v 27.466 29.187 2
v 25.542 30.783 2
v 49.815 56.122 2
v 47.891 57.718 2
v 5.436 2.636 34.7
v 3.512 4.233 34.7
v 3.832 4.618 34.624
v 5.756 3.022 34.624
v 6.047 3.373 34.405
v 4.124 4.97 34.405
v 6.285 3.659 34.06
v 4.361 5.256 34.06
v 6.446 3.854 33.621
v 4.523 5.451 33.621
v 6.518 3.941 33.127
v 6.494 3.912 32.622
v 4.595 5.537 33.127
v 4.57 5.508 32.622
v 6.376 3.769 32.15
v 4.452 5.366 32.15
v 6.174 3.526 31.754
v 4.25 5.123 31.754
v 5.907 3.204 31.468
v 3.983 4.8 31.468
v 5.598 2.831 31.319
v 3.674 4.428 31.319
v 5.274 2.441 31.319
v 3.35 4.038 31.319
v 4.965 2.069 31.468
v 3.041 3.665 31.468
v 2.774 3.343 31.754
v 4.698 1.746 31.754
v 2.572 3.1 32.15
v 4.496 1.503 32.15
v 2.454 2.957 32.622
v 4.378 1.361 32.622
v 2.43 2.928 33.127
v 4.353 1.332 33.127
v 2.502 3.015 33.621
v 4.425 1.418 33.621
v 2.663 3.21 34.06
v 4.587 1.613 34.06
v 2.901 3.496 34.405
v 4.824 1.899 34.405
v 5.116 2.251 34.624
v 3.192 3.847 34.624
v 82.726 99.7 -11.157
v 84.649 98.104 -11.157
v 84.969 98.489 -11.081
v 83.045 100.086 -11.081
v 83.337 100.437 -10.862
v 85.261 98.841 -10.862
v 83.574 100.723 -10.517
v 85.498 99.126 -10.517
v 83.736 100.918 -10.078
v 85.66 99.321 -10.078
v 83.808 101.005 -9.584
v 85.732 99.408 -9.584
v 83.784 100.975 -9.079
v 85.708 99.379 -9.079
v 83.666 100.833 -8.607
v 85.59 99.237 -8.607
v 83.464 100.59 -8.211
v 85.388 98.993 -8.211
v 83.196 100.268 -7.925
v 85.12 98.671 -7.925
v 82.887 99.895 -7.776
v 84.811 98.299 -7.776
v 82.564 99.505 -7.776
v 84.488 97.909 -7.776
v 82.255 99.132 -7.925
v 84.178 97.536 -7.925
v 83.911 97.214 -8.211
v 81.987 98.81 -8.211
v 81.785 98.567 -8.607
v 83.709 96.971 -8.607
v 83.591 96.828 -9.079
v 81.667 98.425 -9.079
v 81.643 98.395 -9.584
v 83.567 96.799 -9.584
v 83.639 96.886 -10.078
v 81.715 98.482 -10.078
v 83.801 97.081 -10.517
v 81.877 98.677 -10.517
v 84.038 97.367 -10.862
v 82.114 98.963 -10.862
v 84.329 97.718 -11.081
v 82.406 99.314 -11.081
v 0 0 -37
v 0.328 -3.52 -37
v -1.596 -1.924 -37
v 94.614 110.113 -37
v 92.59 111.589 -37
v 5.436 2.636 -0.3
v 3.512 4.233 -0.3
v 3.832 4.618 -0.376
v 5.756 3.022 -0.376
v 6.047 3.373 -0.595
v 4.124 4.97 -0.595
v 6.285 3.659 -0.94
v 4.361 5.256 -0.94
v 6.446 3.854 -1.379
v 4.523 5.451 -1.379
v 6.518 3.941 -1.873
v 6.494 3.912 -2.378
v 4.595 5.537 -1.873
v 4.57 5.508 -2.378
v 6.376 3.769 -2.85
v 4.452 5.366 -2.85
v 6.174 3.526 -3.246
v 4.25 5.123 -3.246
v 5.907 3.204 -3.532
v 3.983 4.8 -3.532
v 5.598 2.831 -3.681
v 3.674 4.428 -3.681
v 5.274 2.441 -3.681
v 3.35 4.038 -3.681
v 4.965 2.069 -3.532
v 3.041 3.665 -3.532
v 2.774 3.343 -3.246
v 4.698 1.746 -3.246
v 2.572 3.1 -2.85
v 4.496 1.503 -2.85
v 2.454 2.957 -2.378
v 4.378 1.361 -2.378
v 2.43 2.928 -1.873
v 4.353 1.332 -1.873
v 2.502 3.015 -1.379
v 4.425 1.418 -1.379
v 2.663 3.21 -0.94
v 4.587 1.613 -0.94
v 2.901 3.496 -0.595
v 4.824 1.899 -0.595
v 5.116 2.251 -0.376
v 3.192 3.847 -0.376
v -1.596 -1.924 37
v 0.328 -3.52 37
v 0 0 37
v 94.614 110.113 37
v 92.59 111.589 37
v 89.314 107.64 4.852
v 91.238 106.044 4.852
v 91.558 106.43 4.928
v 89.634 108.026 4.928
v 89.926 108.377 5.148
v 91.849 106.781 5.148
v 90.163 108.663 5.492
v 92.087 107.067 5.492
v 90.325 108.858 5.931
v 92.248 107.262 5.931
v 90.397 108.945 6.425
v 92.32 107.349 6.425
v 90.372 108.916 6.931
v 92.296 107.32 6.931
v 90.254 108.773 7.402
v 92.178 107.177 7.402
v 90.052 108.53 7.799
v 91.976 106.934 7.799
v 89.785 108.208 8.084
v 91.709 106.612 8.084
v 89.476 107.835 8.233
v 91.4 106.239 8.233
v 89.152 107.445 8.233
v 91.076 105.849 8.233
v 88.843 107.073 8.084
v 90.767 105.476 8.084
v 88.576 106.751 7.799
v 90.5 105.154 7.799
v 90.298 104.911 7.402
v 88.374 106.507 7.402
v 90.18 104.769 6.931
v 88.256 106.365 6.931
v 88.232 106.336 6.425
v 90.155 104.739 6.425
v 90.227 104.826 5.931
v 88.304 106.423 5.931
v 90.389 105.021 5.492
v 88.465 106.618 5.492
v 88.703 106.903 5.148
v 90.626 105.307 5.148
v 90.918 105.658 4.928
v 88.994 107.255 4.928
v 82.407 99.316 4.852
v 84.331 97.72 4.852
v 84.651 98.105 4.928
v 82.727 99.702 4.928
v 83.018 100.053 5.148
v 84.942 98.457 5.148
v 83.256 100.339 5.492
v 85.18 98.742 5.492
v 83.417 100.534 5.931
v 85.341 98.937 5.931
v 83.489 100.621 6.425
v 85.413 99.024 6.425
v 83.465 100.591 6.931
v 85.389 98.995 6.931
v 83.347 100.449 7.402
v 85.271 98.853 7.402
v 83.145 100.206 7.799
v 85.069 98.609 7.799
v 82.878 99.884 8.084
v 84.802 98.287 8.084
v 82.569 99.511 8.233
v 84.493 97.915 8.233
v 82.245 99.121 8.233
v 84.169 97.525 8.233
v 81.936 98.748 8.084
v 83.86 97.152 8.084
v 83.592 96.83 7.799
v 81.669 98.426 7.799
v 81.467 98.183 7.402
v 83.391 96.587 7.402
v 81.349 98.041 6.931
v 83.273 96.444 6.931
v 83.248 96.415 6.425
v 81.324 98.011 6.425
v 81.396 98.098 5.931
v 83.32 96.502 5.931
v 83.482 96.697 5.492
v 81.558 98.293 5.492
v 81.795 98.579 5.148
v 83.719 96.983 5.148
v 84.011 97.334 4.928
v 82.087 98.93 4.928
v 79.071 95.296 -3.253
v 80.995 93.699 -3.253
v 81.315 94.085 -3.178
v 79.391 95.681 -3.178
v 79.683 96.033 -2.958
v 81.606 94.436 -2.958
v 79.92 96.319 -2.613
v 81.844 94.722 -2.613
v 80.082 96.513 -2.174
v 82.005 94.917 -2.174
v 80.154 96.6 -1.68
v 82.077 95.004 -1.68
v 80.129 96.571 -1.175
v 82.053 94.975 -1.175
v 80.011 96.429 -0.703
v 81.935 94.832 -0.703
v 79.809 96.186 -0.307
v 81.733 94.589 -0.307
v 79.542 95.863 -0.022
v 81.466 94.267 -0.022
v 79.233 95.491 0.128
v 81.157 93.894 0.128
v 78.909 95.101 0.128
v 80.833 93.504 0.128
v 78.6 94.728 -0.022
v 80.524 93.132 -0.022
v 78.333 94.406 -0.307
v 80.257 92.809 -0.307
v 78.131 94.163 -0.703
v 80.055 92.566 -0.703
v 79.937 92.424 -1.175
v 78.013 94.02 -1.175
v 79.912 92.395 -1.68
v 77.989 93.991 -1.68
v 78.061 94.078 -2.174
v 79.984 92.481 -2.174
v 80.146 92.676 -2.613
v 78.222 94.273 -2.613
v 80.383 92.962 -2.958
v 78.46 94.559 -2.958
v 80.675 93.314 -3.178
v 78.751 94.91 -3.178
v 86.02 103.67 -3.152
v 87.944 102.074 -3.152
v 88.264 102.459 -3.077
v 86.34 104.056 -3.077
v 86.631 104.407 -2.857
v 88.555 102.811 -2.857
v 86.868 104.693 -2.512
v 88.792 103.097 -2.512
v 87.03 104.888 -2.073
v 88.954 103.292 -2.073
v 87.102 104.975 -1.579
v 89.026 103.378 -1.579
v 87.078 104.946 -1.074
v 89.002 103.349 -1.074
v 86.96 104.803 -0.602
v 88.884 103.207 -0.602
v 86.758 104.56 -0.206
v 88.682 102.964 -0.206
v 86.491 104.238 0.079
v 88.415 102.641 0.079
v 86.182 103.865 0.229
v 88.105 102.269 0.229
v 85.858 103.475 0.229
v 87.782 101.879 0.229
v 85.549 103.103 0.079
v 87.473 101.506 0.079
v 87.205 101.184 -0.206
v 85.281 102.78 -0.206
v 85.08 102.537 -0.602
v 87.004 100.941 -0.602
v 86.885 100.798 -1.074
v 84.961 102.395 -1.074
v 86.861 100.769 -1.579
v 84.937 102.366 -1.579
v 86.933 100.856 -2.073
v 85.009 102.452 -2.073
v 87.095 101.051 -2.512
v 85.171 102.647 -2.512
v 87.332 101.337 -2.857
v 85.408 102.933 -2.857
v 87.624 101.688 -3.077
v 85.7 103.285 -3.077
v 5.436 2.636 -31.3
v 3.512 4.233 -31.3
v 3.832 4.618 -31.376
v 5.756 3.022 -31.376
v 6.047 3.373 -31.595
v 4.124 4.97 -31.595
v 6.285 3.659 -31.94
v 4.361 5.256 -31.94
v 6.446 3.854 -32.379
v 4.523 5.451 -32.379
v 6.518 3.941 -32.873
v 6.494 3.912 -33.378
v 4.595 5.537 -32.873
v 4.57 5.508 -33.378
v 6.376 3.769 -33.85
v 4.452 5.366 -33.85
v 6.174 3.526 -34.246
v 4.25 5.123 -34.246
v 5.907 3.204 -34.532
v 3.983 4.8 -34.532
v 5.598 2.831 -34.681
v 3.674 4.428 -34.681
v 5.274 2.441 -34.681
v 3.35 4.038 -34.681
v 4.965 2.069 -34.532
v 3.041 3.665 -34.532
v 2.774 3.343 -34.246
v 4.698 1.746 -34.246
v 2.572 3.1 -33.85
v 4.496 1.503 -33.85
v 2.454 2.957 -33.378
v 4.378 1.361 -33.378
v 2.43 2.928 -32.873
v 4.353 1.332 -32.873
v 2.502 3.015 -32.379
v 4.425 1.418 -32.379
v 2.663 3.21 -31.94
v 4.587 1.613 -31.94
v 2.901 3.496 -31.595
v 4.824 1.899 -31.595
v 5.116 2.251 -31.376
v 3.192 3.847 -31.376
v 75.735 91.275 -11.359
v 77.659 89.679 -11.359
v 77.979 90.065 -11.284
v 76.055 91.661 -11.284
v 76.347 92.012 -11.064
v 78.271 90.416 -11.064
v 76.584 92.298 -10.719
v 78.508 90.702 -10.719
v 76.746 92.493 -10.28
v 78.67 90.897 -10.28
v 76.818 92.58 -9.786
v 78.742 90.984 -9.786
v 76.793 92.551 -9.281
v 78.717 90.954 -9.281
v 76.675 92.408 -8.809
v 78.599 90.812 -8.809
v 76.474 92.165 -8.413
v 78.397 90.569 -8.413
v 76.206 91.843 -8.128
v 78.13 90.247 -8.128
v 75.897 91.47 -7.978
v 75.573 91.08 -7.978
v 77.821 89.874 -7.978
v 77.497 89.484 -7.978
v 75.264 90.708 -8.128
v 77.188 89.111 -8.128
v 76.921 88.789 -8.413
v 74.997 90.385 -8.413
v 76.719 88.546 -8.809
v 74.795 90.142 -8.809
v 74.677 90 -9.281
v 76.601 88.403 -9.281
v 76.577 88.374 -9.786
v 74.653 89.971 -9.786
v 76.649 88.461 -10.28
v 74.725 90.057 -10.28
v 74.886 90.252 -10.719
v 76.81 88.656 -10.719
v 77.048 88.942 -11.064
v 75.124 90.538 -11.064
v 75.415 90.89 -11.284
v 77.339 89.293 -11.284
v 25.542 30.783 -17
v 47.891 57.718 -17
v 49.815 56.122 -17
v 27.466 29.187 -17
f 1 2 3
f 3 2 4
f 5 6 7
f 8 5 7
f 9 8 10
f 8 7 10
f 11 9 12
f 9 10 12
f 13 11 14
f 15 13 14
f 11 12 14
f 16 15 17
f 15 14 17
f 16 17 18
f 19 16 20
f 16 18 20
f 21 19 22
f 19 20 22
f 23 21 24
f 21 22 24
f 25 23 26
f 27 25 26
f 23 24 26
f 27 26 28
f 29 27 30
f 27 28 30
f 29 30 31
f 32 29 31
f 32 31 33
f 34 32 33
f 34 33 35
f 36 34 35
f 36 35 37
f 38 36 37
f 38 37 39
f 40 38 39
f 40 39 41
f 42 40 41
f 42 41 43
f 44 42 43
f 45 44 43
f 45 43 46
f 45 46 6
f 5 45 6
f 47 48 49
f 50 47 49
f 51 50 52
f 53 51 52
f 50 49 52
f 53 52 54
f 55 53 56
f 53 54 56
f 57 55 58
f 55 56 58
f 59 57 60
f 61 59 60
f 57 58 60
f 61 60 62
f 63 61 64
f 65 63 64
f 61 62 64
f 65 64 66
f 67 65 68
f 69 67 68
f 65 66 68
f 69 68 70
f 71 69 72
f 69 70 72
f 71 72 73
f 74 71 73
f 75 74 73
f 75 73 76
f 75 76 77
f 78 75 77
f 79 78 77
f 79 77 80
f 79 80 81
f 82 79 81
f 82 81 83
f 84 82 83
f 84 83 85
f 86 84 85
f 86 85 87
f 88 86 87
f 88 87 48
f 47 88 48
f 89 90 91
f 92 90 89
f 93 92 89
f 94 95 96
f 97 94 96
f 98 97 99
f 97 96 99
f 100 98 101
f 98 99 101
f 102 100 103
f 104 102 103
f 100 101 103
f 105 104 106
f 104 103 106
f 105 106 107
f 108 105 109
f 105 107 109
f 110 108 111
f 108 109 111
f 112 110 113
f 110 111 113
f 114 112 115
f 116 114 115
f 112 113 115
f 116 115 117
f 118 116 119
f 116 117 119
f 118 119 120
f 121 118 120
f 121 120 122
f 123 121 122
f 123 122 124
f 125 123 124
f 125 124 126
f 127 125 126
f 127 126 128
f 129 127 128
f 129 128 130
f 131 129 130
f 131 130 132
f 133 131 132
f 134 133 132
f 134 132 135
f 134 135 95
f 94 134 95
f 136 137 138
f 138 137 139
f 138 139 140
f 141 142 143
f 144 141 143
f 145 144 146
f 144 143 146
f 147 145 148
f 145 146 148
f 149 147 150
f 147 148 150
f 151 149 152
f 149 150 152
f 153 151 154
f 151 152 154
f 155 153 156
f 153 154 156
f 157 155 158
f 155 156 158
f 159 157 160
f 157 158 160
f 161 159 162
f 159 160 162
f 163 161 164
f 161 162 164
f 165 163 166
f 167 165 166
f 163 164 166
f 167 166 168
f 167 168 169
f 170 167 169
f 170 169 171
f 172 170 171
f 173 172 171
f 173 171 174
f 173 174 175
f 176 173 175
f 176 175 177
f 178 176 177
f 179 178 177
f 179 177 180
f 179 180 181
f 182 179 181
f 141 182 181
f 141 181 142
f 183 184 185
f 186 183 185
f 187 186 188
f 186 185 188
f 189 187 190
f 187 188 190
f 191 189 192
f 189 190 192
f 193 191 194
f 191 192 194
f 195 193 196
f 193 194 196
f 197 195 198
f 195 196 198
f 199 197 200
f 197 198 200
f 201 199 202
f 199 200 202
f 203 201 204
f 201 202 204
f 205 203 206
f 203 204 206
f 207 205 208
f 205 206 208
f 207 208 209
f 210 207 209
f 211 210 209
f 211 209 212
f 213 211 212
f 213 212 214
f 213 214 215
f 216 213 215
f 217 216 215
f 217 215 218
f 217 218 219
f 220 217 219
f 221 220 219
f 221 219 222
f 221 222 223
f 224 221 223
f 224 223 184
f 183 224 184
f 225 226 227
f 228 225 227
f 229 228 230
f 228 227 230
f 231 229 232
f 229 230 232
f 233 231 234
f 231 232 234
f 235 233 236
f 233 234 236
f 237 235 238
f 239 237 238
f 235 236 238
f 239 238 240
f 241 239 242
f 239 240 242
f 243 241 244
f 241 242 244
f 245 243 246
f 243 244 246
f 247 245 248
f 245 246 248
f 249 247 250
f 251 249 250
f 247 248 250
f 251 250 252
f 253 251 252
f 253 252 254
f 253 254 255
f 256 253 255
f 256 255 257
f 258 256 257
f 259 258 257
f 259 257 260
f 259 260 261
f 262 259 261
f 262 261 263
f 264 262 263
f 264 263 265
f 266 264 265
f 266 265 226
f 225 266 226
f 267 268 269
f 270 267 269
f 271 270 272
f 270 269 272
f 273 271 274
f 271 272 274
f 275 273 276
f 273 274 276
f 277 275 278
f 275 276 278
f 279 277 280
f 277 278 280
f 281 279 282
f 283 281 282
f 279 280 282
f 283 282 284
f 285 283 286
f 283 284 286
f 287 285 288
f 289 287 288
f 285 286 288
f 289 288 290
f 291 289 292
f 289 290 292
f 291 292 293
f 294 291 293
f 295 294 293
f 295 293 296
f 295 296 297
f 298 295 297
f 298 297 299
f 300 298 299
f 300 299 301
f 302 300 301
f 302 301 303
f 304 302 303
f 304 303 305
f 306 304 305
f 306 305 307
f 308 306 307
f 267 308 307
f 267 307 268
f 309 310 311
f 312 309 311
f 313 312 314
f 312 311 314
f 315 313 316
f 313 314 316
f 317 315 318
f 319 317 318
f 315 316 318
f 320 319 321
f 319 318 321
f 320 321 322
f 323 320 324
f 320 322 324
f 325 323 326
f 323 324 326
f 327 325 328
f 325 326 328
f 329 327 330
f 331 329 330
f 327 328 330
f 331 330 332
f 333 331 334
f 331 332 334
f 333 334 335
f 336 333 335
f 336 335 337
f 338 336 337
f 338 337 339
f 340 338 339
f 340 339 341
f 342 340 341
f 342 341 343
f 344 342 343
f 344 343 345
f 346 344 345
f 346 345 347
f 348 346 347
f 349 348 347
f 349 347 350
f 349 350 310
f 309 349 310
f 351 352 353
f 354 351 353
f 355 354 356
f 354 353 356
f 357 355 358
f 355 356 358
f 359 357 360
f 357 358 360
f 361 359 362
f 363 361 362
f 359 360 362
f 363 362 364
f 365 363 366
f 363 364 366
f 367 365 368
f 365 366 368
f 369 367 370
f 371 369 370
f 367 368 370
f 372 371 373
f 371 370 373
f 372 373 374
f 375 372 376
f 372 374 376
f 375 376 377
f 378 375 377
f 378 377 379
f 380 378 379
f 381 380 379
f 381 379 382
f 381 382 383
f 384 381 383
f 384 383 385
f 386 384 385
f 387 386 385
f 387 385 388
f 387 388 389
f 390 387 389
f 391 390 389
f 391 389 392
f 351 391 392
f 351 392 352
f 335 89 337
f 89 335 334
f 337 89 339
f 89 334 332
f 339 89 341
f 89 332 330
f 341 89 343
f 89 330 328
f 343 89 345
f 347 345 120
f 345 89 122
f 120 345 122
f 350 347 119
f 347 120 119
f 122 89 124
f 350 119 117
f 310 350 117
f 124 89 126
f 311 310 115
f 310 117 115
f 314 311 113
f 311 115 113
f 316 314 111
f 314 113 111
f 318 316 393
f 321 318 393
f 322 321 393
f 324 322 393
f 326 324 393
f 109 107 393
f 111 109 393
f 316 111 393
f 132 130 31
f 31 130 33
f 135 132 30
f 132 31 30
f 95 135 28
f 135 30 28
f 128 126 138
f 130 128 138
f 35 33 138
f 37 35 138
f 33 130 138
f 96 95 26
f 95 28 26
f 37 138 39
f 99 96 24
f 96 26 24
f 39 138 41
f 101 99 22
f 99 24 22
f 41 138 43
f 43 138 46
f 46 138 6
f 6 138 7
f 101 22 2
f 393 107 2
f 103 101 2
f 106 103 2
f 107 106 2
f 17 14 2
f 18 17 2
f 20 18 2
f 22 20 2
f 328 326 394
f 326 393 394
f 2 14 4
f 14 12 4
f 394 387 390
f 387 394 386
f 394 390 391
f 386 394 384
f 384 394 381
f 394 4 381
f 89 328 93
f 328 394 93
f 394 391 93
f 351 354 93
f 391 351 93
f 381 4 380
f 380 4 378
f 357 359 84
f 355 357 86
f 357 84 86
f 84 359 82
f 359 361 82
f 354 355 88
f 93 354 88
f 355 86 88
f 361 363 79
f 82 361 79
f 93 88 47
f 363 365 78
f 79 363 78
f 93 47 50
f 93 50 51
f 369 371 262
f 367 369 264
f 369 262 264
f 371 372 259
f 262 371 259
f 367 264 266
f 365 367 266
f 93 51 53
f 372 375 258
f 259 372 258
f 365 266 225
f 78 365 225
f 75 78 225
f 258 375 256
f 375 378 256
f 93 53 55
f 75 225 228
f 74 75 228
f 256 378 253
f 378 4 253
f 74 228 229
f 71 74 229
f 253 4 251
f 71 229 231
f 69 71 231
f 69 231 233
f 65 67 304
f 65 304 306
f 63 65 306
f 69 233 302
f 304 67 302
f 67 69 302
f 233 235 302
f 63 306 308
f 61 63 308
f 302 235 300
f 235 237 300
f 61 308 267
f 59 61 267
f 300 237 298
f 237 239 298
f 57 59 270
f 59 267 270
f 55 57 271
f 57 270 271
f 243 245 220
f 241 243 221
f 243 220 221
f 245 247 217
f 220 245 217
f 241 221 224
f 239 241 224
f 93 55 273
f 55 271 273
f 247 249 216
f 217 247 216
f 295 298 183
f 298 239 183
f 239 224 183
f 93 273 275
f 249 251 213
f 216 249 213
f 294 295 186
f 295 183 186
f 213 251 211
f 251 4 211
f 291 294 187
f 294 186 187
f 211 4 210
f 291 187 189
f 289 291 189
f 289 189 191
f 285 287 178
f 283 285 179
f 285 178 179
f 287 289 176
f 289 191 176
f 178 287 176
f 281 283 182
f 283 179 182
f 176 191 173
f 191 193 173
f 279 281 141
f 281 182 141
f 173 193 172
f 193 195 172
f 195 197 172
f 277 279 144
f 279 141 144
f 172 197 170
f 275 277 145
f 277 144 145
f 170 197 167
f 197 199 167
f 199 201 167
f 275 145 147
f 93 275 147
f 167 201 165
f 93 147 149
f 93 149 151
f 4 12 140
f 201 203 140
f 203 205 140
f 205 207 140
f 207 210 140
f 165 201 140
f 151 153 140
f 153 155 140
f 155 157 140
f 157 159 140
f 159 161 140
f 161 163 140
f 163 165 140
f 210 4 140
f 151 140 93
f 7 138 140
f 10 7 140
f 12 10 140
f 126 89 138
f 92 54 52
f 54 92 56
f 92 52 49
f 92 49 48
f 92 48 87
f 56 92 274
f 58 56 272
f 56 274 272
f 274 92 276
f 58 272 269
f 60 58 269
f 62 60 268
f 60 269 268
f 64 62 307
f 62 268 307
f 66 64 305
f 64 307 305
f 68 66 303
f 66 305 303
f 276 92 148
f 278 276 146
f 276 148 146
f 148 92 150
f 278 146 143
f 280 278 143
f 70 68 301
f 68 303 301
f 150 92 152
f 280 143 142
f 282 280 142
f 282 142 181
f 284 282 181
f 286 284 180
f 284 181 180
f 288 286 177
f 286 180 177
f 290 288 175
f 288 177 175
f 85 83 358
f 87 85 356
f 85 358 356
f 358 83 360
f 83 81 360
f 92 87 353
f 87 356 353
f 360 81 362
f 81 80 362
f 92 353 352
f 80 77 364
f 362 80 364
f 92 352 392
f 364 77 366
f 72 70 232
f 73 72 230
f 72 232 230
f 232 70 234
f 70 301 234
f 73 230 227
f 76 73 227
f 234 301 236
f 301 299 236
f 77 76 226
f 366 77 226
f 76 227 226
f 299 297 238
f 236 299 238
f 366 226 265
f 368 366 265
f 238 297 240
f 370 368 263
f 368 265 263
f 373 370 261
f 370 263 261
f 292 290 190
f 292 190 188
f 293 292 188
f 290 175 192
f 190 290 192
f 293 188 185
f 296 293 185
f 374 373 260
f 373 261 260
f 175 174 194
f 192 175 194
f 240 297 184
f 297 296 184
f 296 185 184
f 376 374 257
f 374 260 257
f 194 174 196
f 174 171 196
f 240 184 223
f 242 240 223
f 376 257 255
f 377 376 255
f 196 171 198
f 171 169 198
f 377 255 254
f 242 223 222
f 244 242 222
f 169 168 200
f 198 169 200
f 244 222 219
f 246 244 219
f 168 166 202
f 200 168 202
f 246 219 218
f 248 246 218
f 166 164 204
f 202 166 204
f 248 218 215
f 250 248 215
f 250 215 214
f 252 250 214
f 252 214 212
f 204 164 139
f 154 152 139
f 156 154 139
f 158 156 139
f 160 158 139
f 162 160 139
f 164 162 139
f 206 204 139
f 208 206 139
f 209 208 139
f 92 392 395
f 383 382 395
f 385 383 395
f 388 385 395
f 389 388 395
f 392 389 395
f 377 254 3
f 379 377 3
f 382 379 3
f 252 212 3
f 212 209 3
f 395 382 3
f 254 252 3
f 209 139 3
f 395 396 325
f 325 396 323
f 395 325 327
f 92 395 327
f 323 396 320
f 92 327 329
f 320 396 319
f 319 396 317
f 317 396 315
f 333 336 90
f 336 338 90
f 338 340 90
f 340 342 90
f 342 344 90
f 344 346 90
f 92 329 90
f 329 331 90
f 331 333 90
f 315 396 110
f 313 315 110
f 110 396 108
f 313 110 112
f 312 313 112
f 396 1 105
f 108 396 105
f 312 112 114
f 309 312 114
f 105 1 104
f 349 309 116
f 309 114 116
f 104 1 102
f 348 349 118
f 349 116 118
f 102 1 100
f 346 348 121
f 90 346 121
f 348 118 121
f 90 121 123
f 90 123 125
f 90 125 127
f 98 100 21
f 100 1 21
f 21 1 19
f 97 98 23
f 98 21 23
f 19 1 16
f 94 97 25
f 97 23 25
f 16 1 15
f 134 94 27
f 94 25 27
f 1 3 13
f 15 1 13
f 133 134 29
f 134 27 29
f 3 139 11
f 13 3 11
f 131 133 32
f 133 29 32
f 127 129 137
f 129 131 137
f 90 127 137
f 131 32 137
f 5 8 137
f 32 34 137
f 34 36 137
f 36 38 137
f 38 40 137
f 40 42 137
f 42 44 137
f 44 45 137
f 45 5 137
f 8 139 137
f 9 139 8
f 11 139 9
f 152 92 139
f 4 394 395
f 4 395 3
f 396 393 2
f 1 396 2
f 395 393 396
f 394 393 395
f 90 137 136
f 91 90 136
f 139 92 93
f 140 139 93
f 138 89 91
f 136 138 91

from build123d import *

# Parameters (mm, degrees)
ESTRUSIONE_SOTTILE1_DEPTH      = 37
ESTRUSIONE_SOTTILE1_DEPTH_BACK = 37
SCHIZZO2_R                     = 1.7
TAGLIO_ESTRUSIONE2_DEPTH       = 23
SCHIZZO4_W                     = 19
SCHIZZO4_H                     = 35
TAGLIO_ESTRUSIONE4_DEPTH       = 9
SCHIZZO5_R                     = 1.7
TAGLIO_ESTRUSIONE5_DEPTH       = 9
TAGLIO_ESTRUSIONE6_DEPTH       = 38
TAGLIO_ESTRUSIONE6_DEPTH_BACK  = 38


with BuildPart() as part:
    # Schizzo1 → Estrusione-Sottile1 (new body, two sides)
    with BuildSketch(Plane.XY) as estrusione_sottile1_sk:
        with BuildLine():
            Line((1.3418419, 31.371953403), (-14.62198067, 12.132505153))
            Line((-14.62198067, 12.132505153), (0, 0))
            Line((0, 0), (92.590170907, 111.588799848))
            ThreePointArc((92.590170907, 111.588799848), (116.785428363, 124.808829232), (140.980685819, 111.588799848))
            Line((140.980685819, 111.588799848), (138.876827802, 110.238325322))
            ThreePointArc((138.876827802, 110.238325322), (116.710841454, 122.30872327), (94.613803758, 110.112560659))
            Line((94.613803758, 110.112560659), (0.327562568, -3.520327082))
            Line((0.327562568, -3.520327082), (-18.142307752, 11.804942585))
            Line((-18.142307752, 11.804942585), (-0.582102925, 32.96833566))
            Line((-0.582102925, 32.96833566), (1.3418419, 31.371953403))
        make_face()
    extrude(amount=ESTRUSIONE_SOTTILE1_DEPTH)
    extrude(estrusione_sottile1_sk.sketch, amount=-ESTRUSIONE_SOTTILE1_DEPTH_BACK)

    # Schizzo2 → Taglio-Estrusione2 (cut)
    with BuildSketch(Plane(origin=(1.923944825, -1.596382257, 0), x_dir=(0, 0, -1), z_dir=(0.76957793, -0.638552903, 0))):
        with Locations((-6.552412565, 139.86942204)):
            Circle(SCHIZZO2_R)
        with Locations((-6.552412565, 129.05255699)):
            Circle(SCHIZZO2_R)
        with Locations((1.452296176, 134.71047302)):
            Circle(SCHIZZO2_R)
        with Locations((9.457004918, 129.55152401)):
            Circle(SCHIZZO2_R)
        with Locations((1.553386665, 123.82845624)):
            Circle(SCHIZZO2_R)
        with Locations((9.659185895, 118.60435549)):
            Circle(SCHIZZO2_R)
    extrude(amount=-TAGLIO_ESTRUSIONE2_DEPTH, mode=Mode.SUBTRACT)

    # Schizzo4 → Taglio-Estrusione4 (cut)
    with BuildSketch(Plane(origin=(0, 0, 0), x_dir=(0, 0, 1), z_dir=(-0.76957793, 0.638552903, 0))):
        with Locations((-7.5, 57.5)):
            Rectangle(SCHIZZO4_W, SCHIZZO4_H)
    extrude(amount=-TAGLIO_ESTRUSIONE4_DEPTH, mode=Mode.SUBTRACT)

    # Schizzo5 → Taglio-Estrusione5 (cut)
    with BuildSketch(Plane(origin=(0, 0, 0), x_dir=(0, 0, 1), z_dir=(-0.76957793, 0.638552903, 0))):
        with Locations((33, 5.5)):
            Circle(SCHIZZO5_R)
        with Locations((-33, 5.5)):
            Circle(SCHIZZO5_R)
        with Locations((-2, 5.5)):
            Circle(SCHIZZO5_R)
    extrude(amount=-TAGLIO_ESTRUSIONE5_DEPTH, mode=Mode.SUBTRACT)

    # Schizzo6 → Taglio-Estrusione6 (cut, two sides)
    with BuildSketch(Plane.XY) as taglio_estrusione6_sk:
        Polygon((0, 0), (-2.515119204, -3.03119792), (-24.654006172, 16.441396342), (100.036117815, 158.204765097), (192.825186497, 76.590730526), (160.291370892, 39.602209292), (94.613803758, 110.112560659), (92.590170907, 111.588799848), (78.649981188, 114.87986373), align=None)
    extrude(amount=TAGLIO_ESTRUSIONE6_DEPTH, mode=Mode.SUBTRACT)
    extrude(taglio_estrusione6_sk.sketch, amount=-TAGLIO_ESTRUSIONE6_DEPTH_BACK, mode=Mode.SUBTRACT)


solid = part.part
